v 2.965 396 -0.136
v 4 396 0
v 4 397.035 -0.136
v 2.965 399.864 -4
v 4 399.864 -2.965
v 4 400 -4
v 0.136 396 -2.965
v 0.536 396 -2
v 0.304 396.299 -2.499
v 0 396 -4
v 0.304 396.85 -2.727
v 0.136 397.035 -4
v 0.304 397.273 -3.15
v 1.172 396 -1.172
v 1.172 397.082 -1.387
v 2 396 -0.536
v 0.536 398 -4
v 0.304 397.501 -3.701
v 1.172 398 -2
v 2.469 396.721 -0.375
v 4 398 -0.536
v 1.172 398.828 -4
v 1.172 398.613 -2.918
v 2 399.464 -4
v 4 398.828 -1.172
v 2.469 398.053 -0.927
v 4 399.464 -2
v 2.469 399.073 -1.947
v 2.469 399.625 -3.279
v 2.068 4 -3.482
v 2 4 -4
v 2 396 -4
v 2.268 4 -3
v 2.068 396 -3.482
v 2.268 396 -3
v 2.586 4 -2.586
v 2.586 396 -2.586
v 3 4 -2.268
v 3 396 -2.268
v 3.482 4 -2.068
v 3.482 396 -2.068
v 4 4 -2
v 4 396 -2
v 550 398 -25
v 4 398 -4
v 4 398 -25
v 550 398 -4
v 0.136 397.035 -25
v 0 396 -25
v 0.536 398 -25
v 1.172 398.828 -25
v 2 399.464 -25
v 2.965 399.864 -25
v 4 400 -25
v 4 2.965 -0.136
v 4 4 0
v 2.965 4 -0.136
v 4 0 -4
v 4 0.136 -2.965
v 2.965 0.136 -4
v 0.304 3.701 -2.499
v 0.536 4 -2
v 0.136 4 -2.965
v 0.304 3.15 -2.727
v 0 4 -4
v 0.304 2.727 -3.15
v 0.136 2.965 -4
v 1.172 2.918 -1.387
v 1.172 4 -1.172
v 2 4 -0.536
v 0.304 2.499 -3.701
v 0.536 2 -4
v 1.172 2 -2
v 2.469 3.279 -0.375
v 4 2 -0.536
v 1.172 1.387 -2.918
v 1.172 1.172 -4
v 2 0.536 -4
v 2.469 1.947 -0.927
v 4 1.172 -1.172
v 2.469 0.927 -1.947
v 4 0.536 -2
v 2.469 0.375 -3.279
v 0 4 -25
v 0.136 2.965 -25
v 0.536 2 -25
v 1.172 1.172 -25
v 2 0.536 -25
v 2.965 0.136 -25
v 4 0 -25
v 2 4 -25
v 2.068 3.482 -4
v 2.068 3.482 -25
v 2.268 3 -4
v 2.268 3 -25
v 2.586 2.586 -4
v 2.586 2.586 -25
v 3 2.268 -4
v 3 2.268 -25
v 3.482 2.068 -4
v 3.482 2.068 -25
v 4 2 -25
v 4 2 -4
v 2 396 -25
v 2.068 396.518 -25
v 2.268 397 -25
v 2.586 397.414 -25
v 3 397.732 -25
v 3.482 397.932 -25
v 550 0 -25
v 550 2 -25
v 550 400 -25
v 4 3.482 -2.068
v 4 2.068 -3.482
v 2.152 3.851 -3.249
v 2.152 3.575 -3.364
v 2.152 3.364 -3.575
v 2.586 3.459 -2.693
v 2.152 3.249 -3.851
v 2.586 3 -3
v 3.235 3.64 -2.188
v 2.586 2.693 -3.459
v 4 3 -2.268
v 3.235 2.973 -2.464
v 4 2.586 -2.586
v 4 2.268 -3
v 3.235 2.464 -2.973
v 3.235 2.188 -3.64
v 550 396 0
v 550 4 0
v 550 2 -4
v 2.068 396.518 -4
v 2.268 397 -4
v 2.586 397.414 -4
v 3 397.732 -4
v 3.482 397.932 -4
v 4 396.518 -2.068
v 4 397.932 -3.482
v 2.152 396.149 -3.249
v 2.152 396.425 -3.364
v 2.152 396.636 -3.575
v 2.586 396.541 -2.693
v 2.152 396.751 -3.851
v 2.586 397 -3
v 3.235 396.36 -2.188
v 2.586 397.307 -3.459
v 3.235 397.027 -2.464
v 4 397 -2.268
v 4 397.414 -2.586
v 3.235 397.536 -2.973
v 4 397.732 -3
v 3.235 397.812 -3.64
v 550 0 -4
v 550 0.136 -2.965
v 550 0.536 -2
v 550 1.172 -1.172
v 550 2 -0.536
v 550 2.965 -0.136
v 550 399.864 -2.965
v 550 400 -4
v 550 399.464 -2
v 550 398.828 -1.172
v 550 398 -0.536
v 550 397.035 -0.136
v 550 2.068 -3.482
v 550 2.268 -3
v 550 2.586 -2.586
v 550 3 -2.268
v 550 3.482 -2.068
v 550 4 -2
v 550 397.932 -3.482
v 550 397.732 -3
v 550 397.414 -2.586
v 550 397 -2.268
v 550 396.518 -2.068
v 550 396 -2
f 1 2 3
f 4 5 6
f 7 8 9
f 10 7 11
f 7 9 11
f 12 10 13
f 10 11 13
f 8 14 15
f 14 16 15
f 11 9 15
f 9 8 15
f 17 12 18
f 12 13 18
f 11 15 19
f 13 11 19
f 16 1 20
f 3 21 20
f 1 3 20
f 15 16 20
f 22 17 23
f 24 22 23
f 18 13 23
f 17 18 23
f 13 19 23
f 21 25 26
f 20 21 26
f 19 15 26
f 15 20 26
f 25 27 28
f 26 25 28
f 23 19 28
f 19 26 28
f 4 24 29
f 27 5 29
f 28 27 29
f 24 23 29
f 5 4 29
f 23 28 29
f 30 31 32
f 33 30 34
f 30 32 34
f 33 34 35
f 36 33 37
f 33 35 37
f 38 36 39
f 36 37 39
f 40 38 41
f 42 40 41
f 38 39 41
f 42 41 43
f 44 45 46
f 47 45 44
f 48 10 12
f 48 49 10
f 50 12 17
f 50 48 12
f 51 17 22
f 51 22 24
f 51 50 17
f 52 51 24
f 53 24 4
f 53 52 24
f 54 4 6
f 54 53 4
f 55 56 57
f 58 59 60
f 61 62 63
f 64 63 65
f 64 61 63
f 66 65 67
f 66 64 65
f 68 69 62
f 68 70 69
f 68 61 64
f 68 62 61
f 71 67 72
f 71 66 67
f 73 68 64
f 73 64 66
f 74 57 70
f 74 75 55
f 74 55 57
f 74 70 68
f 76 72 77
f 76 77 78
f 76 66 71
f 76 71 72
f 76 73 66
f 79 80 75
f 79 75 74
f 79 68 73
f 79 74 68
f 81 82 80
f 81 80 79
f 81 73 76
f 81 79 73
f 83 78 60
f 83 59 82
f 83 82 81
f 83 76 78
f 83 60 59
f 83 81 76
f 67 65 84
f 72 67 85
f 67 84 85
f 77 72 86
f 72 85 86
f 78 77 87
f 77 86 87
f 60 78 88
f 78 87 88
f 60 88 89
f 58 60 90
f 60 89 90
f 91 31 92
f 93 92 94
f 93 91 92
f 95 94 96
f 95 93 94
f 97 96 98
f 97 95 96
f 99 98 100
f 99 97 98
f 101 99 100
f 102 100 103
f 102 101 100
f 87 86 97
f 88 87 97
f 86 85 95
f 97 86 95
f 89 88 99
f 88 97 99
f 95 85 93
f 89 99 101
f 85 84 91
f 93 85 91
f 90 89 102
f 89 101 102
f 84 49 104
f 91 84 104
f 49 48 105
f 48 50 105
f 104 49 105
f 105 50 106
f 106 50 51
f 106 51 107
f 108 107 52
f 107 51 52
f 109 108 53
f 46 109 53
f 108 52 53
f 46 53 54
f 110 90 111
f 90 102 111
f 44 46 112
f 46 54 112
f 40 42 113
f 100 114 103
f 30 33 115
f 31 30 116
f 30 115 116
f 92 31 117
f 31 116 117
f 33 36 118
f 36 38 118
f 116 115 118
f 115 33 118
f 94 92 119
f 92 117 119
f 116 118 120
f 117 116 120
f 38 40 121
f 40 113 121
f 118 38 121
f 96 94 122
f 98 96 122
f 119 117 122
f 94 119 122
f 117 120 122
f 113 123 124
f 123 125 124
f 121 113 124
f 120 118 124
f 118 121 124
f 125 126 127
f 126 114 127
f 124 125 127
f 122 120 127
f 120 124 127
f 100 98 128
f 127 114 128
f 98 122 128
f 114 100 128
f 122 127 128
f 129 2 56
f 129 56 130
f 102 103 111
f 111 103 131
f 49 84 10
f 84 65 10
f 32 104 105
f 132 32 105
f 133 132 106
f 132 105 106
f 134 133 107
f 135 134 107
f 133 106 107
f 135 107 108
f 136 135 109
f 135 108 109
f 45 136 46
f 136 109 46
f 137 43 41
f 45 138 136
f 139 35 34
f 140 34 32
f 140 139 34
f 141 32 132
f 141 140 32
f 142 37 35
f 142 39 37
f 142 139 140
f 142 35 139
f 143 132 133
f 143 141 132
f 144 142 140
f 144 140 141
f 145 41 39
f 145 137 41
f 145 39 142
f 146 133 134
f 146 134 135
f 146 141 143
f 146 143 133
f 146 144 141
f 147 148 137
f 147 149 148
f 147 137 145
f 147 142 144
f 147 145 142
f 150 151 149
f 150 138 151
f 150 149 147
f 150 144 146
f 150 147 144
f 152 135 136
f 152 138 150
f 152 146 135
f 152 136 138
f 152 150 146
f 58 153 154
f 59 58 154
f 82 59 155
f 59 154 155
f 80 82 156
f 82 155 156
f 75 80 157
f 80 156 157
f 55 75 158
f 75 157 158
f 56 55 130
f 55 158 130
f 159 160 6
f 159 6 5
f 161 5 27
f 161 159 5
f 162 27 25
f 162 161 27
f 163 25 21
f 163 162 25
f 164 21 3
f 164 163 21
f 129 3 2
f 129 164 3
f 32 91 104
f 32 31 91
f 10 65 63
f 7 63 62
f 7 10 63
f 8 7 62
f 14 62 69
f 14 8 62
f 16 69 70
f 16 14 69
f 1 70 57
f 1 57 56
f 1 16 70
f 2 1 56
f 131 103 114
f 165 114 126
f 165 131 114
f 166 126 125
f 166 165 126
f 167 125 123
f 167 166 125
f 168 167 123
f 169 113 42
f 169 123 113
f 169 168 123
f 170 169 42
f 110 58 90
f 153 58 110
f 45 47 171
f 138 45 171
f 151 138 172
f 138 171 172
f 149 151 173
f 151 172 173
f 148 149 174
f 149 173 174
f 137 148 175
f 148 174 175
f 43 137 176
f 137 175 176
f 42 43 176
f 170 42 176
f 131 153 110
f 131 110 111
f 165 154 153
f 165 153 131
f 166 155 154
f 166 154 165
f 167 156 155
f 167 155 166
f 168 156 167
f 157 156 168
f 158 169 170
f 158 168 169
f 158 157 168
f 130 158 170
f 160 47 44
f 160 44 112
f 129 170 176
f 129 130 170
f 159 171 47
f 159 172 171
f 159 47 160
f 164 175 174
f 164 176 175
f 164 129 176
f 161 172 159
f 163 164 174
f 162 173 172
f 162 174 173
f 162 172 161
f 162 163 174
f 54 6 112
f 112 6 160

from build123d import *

# Parameters (mm, degrees)
SKETCH_1_W      = 550
SKETCH_1_H      = 400
EXTRUDE_1_DEPTH = 25
FILLET_1_R      = 4
SHELL_1_T       = -2


with BuildPart() as part:
    # 草图1 → 凸台-拉伸1 (new body)
    with BuildSketch(Plane.XY):
        with Locations((275, 200)):
            Rectangle(SKETCH_1_W, SKETCH_1_H)
    extrude(amount=-EXTRUDE_1_DEPTH)

    # 圆角1
    fillet_1_edges = [part.edges().sort_by_distance(p)[0] for p in [
        (275, 400, 0),
        (275, 0, 0),
        (0, 200, 0),
        (0, 400, -12.5),
        (0, 0, -12.5),
    ]]
    fillet(fillet_1_edges, radius=FILLET_1_R)

    # 抽壳1
    shell_1_openings = [part.faces().sort_by_distance(p)[0] for p in [
        (275.008556451, 200, -25),
        (550, 200, -12.507975981),
    ]]
    offset(amount=SHELL_1_T, openings=shell_1_openings, kind=Kind.INTERSECTION)


solid = part.part
